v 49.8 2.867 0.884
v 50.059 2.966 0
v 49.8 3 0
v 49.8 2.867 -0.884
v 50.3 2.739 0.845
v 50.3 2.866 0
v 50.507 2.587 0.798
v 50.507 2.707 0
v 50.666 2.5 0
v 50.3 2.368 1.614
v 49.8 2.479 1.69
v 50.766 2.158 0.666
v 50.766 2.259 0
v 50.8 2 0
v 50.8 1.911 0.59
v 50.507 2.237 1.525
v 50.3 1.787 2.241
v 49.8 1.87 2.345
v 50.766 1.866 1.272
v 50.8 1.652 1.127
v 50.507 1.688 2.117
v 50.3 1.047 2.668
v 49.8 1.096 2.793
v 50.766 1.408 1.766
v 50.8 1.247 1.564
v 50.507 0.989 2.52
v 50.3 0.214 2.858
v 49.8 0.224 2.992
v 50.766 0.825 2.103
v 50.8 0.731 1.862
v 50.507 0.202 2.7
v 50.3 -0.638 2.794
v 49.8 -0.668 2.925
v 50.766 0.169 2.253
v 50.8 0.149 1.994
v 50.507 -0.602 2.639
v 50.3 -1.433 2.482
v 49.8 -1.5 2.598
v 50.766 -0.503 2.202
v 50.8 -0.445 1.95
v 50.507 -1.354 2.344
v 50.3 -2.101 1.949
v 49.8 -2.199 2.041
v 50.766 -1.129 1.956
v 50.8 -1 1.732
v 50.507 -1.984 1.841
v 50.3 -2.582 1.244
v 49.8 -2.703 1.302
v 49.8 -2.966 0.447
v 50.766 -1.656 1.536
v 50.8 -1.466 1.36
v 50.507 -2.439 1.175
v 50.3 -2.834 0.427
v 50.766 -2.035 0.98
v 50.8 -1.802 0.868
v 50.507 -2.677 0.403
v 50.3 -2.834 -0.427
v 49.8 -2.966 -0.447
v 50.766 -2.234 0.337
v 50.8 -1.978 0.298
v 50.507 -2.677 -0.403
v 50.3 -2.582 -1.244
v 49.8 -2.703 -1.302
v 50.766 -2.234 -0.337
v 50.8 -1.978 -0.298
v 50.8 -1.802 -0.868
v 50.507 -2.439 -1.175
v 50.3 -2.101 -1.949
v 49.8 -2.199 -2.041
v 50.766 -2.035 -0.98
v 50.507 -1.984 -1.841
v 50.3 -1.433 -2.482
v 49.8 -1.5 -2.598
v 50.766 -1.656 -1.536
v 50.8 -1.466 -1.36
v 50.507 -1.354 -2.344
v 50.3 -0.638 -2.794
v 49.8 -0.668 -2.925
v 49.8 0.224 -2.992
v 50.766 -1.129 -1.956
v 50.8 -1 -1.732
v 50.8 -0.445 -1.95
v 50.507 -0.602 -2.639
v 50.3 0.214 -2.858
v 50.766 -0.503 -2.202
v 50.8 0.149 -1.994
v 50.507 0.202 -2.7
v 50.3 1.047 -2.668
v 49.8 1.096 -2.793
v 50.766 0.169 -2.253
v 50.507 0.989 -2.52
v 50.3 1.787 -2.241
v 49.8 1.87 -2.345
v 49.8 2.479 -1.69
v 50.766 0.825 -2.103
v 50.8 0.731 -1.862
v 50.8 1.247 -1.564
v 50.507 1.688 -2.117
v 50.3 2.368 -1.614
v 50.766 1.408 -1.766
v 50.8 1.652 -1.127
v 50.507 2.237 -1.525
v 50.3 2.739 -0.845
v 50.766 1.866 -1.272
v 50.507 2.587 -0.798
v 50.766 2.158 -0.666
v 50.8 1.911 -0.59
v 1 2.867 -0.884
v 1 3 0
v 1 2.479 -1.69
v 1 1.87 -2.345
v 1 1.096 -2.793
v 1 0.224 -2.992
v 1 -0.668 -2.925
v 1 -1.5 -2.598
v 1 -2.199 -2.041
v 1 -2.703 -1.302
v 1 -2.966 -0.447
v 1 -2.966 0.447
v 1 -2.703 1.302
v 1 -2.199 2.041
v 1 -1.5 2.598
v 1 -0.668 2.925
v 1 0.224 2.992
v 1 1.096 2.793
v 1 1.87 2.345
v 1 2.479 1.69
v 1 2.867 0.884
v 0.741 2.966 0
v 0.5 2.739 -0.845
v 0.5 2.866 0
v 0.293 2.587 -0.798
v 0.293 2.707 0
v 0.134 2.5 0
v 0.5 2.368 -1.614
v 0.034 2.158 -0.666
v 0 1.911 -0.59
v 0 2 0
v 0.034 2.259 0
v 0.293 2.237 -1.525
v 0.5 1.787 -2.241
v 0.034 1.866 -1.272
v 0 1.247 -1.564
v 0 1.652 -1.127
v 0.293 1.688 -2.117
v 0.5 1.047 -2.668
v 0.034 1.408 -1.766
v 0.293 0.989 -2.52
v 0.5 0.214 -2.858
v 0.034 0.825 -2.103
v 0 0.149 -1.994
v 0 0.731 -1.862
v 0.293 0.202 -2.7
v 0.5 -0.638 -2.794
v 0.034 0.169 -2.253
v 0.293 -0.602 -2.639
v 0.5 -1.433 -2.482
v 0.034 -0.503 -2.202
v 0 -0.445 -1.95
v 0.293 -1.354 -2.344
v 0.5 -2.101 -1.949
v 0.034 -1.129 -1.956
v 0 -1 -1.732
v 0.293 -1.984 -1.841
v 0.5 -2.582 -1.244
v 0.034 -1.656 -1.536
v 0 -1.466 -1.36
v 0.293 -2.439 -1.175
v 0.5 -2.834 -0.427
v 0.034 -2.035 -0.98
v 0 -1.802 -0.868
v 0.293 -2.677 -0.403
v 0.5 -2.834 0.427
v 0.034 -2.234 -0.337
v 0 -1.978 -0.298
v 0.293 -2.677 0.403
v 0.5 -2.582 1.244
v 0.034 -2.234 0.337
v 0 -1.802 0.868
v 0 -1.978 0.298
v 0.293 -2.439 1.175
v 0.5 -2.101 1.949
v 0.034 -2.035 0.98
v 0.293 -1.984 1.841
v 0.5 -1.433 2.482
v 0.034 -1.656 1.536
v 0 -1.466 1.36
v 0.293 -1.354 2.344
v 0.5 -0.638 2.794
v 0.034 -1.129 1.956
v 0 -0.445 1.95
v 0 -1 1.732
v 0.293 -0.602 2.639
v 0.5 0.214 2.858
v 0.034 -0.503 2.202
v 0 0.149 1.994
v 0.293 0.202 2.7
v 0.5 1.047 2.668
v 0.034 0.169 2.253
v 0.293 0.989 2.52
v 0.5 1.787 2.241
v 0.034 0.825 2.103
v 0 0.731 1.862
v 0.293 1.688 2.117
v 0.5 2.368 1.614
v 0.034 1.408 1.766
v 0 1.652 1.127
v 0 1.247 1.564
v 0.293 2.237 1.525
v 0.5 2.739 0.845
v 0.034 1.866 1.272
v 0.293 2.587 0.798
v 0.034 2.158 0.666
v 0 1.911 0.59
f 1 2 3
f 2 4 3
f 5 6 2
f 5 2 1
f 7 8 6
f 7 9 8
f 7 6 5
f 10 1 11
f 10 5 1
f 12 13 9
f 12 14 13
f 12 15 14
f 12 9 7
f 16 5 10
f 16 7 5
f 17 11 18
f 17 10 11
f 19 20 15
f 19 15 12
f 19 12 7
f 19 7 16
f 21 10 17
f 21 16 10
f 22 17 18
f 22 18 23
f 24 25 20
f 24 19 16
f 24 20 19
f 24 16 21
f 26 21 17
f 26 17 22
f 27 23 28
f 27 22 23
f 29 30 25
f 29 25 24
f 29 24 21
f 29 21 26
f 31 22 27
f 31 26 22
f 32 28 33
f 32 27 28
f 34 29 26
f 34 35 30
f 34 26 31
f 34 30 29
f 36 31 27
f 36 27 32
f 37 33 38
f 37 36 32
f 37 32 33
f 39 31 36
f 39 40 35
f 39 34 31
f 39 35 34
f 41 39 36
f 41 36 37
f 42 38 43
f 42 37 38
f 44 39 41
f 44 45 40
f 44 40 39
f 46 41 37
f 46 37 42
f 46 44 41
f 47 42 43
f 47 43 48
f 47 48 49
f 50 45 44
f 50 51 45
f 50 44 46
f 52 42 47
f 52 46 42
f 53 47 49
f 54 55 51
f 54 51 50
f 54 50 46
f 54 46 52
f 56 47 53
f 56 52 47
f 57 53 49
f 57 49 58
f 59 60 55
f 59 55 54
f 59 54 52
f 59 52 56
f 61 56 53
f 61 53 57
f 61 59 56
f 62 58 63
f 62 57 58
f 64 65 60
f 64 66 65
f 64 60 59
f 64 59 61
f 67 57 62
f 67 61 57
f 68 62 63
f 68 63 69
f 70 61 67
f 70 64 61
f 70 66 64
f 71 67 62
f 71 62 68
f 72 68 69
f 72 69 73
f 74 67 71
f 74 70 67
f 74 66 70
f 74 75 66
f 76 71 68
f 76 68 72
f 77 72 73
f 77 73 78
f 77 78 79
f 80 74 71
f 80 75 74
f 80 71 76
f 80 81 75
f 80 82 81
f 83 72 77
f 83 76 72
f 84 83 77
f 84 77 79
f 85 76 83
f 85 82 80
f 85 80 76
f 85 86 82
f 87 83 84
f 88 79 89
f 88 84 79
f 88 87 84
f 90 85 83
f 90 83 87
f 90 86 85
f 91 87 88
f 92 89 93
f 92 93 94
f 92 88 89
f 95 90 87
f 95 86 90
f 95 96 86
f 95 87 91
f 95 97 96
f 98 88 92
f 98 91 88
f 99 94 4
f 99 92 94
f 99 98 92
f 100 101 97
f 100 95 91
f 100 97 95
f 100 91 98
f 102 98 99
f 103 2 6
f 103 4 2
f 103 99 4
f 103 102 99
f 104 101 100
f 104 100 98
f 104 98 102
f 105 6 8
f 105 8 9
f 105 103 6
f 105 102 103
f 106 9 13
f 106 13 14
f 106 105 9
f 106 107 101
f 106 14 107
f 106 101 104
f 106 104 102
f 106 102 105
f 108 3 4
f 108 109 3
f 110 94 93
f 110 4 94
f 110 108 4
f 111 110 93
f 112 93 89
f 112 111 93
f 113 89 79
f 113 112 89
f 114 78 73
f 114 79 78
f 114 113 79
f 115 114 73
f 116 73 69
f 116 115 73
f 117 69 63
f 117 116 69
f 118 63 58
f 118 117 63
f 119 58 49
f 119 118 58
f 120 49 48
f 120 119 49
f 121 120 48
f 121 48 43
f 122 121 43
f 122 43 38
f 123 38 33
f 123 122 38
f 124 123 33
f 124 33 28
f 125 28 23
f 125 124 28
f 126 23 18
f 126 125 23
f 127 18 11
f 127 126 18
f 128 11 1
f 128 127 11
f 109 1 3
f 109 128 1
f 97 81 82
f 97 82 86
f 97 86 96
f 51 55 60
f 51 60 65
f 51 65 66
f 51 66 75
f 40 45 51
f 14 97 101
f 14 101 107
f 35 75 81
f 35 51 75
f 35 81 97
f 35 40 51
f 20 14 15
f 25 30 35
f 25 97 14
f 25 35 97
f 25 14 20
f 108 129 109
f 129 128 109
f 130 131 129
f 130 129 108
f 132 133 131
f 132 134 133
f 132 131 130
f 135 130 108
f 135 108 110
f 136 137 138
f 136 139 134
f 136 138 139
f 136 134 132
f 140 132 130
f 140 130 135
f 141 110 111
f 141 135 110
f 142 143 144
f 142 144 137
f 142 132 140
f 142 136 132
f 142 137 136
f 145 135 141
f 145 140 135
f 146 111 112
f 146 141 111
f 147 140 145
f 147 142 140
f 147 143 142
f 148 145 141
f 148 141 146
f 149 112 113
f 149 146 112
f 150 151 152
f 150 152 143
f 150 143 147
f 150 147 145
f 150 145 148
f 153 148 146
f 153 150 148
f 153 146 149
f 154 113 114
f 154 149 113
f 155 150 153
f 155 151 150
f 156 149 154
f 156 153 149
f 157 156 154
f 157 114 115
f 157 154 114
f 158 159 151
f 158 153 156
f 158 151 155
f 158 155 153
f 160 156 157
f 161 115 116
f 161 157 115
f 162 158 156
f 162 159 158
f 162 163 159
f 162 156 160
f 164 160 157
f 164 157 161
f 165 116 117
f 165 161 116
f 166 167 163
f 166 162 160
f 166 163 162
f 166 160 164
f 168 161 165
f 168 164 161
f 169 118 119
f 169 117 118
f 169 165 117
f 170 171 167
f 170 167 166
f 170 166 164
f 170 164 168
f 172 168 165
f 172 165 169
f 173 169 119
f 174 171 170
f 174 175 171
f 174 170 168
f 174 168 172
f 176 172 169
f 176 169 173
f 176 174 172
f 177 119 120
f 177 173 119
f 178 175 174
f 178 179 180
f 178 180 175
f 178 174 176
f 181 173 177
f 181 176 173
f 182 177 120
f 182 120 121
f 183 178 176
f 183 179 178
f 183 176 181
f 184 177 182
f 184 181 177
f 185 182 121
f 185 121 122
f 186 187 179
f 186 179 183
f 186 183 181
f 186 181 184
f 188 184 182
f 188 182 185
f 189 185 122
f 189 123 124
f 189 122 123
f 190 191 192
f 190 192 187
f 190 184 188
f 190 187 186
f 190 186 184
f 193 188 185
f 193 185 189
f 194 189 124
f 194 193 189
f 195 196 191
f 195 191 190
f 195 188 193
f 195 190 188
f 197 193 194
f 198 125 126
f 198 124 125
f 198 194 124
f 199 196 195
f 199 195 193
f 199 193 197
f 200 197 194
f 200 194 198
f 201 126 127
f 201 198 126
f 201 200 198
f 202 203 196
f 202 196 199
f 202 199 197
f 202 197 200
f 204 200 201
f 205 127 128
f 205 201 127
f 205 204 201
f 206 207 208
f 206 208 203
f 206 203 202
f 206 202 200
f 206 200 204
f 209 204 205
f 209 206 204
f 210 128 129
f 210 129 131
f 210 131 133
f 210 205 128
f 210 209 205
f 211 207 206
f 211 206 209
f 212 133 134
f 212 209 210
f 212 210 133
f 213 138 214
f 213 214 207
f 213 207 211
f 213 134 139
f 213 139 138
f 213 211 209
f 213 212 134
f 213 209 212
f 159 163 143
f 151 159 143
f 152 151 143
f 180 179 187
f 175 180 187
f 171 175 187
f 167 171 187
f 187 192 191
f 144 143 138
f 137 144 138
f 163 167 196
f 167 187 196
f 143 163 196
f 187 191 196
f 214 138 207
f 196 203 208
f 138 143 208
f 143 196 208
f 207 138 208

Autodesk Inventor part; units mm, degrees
ref_plane "YZ Plane" through (0, 0, 0) normal (1, 0, 0) x (0, 1, 0)
ref_plane "XZ Plane" through (0, 0, 0) normal (0, 1, 0) x (-1, 0, 0)
ref_plane "XY Plane" through (0, 0, 0) normal (0, 0, 1) x (1, 0, 0)
sketch "Sketch1" plane through (0, 0, 0) normal (1, 0, 0) x (0, 1, 0)
  circle A0 centre (0, 0) radius 3
  dimension "d0" = 6
extrude "Extrusion1" add sketch "Sketch1" along normal blind 50.8
fillet "Fillet1" radius 1 1 edges at (50.8, -3, 0)
fillet "Fillet2" radius 1 1 edges at (0, -3, 0)
properties part number "axle small" material "Stainless Steel"
